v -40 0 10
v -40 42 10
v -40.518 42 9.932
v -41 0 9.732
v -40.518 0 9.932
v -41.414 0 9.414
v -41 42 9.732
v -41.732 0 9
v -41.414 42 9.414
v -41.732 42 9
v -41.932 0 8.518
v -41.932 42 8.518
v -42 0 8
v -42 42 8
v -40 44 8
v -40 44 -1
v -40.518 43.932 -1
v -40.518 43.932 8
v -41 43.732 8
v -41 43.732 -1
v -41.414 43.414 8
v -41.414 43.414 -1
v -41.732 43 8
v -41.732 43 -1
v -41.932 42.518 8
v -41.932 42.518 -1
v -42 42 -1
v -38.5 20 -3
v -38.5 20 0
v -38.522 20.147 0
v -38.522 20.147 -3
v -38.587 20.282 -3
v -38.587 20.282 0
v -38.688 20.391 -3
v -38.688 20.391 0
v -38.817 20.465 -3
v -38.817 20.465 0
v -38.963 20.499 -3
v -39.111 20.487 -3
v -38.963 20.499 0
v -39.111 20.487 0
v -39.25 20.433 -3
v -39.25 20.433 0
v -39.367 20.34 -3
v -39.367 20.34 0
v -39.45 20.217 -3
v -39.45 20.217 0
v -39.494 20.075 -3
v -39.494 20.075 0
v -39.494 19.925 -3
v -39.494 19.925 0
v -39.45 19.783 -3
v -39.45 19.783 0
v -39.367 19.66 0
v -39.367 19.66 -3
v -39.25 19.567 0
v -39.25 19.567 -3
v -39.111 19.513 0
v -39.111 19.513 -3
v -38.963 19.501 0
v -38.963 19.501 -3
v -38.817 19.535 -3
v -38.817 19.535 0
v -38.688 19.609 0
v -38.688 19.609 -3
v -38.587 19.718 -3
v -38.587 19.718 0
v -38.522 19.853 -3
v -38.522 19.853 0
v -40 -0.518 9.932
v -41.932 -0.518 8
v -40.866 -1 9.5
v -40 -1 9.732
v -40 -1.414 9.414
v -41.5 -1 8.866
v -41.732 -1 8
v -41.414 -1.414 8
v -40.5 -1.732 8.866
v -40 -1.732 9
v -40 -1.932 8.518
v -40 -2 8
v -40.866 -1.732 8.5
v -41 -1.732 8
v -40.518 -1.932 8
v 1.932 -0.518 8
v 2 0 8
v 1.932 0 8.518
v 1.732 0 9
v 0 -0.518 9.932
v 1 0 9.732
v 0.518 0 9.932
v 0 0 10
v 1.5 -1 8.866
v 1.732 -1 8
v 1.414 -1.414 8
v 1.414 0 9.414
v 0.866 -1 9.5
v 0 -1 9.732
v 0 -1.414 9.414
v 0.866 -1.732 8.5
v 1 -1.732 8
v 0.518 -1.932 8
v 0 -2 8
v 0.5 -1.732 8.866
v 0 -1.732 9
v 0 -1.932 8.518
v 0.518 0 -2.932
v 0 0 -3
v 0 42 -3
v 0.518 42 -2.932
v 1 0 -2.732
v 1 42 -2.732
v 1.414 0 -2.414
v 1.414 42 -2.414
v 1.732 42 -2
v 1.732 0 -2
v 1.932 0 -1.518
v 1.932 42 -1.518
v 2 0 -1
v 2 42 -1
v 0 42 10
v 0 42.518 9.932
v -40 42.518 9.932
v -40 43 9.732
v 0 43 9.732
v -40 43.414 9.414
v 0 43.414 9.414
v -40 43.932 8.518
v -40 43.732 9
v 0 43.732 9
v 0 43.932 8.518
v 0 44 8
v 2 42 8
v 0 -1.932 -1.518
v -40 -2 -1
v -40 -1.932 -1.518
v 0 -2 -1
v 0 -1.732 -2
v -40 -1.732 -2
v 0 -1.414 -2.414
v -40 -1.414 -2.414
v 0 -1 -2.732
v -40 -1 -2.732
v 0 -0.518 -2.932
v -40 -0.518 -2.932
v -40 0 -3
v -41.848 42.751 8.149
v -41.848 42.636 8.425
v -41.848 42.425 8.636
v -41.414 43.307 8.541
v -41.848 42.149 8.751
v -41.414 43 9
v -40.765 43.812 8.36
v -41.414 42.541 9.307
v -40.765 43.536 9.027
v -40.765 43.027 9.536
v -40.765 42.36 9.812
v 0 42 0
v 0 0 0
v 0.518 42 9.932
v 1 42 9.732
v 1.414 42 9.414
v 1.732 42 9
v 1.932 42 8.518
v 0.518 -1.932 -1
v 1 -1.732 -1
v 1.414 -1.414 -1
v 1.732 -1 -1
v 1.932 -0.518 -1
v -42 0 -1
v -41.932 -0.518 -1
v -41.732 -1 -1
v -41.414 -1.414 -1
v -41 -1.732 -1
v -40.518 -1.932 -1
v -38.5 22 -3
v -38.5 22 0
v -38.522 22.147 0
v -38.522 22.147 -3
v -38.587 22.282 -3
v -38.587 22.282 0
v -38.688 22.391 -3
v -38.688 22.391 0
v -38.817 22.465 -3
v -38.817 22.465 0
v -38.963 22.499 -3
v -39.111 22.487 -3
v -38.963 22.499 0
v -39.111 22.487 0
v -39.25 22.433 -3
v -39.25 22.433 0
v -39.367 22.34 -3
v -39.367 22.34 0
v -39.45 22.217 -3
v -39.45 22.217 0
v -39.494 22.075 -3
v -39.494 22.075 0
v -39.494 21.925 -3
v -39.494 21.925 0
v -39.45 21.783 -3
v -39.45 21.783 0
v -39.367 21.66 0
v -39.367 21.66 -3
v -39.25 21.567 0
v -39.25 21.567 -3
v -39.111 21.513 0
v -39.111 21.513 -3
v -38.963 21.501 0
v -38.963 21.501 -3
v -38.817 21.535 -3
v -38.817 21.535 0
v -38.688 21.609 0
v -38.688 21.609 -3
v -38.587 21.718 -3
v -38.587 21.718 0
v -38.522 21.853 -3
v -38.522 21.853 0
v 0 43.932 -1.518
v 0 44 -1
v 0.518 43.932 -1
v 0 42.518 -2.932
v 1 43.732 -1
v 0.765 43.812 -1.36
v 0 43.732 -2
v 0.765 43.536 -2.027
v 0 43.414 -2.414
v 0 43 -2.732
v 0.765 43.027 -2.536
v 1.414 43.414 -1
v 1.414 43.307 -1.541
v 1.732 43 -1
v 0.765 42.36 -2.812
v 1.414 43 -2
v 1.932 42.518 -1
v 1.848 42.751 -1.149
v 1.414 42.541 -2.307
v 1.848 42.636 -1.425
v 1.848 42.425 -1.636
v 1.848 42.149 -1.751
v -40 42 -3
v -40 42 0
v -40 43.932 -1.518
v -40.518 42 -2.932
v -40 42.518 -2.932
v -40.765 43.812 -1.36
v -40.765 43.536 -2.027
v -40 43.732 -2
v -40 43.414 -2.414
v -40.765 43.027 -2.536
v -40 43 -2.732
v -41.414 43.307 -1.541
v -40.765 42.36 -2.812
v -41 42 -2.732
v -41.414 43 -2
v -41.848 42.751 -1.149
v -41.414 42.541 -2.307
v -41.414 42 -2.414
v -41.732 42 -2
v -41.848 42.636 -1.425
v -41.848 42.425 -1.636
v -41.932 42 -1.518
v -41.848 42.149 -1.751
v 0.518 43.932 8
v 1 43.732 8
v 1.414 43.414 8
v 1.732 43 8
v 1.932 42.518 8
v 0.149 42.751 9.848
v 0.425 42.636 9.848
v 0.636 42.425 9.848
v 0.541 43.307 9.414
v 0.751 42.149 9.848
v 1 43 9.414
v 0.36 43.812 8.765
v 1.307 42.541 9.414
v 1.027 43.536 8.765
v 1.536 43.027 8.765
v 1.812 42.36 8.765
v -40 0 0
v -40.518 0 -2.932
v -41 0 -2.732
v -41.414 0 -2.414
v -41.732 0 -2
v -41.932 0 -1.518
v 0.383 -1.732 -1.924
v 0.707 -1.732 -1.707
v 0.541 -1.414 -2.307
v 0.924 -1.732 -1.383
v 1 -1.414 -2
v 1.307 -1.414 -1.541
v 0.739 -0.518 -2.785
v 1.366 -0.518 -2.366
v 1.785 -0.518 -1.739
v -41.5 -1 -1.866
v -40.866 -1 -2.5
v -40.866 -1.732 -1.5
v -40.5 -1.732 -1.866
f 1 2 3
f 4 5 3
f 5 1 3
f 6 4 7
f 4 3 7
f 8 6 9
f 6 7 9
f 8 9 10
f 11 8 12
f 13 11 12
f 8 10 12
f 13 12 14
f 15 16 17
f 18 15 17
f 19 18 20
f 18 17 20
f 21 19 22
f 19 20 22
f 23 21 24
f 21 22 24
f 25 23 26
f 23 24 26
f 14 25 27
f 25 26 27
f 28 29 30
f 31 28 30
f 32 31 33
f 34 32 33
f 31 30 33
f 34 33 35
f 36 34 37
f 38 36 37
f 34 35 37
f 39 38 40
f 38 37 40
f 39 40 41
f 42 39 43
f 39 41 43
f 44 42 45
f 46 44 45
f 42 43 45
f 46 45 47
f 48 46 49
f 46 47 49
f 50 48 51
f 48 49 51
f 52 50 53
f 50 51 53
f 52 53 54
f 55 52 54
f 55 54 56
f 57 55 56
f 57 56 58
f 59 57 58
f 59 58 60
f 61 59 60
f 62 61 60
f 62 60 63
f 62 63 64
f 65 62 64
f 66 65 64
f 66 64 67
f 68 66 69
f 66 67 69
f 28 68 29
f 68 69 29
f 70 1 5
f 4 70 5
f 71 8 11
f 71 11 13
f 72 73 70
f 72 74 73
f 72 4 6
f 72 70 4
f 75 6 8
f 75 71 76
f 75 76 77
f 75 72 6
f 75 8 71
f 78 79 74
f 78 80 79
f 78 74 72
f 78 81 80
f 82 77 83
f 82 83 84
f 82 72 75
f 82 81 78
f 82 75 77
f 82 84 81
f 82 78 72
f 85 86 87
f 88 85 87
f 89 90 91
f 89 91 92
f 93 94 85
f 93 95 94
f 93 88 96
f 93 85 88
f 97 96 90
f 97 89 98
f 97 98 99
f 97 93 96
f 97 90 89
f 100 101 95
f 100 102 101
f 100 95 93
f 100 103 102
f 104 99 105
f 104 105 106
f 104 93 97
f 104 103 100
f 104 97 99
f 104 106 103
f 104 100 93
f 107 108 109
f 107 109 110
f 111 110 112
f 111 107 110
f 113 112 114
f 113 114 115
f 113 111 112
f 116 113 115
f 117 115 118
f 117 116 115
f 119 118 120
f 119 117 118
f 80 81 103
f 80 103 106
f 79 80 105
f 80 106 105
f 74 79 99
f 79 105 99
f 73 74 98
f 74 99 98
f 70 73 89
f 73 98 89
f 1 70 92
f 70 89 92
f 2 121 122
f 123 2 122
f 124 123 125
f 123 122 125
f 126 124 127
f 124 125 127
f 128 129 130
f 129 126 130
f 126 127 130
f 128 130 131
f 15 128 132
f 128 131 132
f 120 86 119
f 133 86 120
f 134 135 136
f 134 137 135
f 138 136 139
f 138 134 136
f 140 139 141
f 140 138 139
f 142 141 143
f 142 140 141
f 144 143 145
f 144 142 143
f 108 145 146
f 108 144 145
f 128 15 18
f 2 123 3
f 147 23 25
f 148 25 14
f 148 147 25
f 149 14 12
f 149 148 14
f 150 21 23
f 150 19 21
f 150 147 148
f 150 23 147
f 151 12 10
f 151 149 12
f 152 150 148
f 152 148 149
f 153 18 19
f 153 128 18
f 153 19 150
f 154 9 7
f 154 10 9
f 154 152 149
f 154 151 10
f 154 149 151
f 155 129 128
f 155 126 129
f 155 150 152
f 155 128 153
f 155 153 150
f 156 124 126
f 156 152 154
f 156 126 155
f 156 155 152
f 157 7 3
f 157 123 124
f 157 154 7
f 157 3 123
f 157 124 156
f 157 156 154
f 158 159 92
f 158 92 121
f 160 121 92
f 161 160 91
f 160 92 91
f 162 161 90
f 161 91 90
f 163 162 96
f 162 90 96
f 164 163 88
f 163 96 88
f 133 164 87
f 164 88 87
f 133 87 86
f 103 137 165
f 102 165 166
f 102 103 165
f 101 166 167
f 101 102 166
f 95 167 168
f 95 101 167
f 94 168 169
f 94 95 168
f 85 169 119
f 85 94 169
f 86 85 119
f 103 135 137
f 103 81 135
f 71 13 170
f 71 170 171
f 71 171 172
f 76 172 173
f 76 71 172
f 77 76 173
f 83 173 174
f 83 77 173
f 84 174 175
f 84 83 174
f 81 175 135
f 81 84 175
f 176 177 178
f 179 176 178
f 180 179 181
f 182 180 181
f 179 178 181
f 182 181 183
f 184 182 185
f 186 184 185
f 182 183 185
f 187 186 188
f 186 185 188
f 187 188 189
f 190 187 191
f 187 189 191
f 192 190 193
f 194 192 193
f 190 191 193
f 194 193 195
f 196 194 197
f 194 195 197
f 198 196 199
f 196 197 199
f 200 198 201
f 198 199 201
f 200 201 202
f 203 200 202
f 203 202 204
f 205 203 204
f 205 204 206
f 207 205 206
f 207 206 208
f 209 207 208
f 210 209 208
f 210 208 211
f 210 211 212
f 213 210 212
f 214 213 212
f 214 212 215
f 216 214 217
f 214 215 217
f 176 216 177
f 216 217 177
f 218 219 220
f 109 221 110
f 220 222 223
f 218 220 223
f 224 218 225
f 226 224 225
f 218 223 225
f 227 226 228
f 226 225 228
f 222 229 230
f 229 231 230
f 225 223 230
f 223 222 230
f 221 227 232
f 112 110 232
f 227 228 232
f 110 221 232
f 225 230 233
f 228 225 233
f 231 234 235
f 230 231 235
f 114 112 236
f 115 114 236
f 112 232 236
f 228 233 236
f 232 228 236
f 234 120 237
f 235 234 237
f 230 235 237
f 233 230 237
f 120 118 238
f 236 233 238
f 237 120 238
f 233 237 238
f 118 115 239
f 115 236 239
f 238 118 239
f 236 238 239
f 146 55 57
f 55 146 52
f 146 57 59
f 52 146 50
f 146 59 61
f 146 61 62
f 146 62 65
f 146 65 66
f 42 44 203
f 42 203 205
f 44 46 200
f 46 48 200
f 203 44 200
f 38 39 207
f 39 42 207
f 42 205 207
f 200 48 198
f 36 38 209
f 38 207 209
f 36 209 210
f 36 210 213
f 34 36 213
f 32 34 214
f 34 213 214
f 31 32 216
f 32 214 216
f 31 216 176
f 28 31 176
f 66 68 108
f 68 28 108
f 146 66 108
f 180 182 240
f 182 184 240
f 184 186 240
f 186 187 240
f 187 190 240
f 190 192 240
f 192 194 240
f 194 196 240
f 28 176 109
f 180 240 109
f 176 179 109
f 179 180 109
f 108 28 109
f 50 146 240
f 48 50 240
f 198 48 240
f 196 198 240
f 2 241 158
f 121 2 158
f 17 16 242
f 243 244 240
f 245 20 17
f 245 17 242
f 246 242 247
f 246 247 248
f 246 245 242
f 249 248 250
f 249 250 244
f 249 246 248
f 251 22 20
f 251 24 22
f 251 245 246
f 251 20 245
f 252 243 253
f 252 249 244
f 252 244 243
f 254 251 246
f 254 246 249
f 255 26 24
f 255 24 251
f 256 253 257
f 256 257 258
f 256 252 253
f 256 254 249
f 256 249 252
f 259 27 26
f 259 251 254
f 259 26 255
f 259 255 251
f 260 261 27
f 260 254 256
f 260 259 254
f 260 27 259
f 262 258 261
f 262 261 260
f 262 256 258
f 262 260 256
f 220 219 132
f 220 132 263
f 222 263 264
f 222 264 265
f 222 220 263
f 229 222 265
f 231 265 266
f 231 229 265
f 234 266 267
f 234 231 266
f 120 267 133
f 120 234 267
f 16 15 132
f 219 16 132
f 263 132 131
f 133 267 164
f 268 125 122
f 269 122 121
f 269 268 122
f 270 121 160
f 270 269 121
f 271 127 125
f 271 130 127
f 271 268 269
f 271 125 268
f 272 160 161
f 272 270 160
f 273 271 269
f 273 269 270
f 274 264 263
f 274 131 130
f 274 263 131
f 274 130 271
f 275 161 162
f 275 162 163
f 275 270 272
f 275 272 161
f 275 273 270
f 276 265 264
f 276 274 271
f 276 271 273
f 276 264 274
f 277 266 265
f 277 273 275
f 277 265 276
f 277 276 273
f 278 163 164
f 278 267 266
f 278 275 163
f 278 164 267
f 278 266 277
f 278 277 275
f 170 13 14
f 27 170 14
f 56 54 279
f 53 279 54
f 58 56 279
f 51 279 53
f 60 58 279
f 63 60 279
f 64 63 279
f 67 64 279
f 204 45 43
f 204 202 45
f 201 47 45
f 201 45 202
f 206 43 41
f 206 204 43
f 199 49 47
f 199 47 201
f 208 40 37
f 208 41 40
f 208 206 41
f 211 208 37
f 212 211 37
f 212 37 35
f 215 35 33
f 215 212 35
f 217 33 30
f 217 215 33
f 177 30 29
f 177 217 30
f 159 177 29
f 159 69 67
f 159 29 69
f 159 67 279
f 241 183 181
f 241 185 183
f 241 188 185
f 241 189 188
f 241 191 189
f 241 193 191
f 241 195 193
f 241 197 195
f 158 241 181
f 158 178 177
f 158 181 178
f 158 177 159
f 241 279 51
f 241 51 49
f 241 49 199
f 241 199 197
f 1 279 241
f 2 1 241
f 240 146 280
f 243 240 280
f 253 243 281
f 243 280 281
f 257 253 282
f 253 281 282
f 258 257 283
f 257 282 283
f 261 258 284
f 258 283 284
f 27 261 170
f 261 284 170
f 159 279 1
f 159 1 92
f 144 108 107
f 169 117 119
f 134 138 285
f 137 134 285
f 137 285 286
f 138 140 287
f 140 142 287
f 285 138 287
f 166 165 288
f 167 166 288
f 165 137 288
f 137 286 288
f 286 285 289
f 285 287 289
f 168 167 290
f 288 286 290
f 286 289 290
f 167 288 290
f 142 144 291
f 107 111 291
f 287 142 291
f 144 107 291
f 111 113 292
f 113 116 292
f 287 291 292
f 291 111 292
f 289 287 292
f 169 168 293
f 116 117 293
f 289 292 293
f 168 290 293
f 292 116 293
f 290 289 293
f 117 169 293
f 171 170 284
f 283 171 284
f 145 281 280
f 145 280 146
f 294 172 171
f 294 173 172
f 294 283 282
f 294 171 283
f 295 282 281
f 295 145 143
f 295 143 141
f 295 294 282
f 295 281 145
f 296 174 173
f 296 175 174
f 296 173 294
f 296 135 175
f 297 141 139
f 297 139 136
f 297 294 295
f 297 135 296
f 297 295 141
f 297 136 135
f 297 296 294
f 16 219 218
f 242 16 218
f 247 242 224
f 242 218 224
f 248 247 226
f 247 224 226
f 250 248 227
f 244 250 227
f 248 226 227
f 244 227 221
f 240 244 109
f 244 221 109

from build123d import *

# Parameters (mm, degrees)
SKETCH_1_W          = 40
SKETCH_1_H          = 42
EXTRUDE_1_DEPTH     = 10
SKETCH_2_W          = 44
SKETCH_2_H          = 46
EXTRUDE_2_DEPTH     = 3
FILLET_1_R          = 2
FILLET_2_R          = 2
FILLET_3_R          = 2
FILLET_4_R          = 2
FILLET_5_R          = 2
SKETCH_4_R          = 0.5
CUT_EXTRUDE_1_DEPTH = 3


# Some blends are built 0.0001 mm under size
with BuildPart() as part:
    # 草图1 → 凸台-拉伸1 (new body)
    with BuildSketch(Plane.XY):
        Polygon((-42, -2), (0, -2), (2, -2), (2, 44), (-42, 44), align=None)
        with Locations((-20, 21)):
            Rectangle(SKETCH_1_W, SKETCH_1_H, mode=Mode.SUBTRACT)
    extrude(amount=EXTRUDE_1_DEPTH)

    # 草图2 → 凸台-拉伸2 (add)
    with BuildSketch(Plane.XY):
        with Locations((-20, 21)):
            Rectangle(SKETCH_2_W, SKETCH_2_H)
    extrude(amount=-EXTRUDE_2_DEPTH)

    # 圆角1
    fillet_1_edges = [part.edges().sort_by_distance(p)[0] for p in [
        (-20, 44, -3),
    ]]
    fillet(fillet_1_edges, radius=FILLET_1_R)

    # 圆角2
    fillet_2_edges = [part.edges().sort_by_distance(p)[0] for p in [
        (2, 44, 4.5),
        (2, 20, -3),
        (2, 43.414213562, -2.414213562),
    ]]
    fillet(fillet_2_edges, radius=FILLET_2_R)

    # 圆角3
    fillet_3_edges = [part.edges().sort_by_distance(p)[0] for p in [
        (-42, -2, 3.5),
        (2, -2, 4.5),
        (-21, -2, -3),
        (1.414213562, -2, -2.414213562),
        (-20, -2, 10),
    ]]
    fillet(fillet_3_edges, radius=FILLET_3_R - 0.0001)  # a hair under: the kernel refuses the full size

    # 圆角4
    # the kernel refuses this fillet: 2 mm, written as the material it takes off along each edge
    with BuildSketch(Plane(origin=(0, -2, 8), x_dir=(1, 0, 0), z_dir=(0, 0, -1))) as fillet_4_piece_1:
        with BuildLine():
            CenterArc((0.0001, -1.9999), 1.9999, 0, 90)
            Line((2, -1.9999), (2, 0))
            Line((2, 0), (0.0001, 0))
        make_face()
    revolve(axis=Axis((0, -2, 8), (0, -1, 0)), revolution_arc=90, mode=Mode.SUBTRACT)
    with BuildSketch(Plane(origin=(0, 44, 10), x_dir=(0, -1, 0), z_dir=(-1, 0, 0))) as fillet_4_piece_2:
        with BuildLine():
            CenterArc((FILLET_4_R, -FILLET_4_R), FILLET_4_R, 90, 90)
            Line((0, -FILLET_4_R), (0, 0))
            Line((0, 0), (FILLET_4_R, 0))
        make_face()
    extrude(amount=47, mode=Mode.SUBTRACT)
    with BuildSketch(Plane(origin=(0, 42, 10), x_dir=(0, 1, 0), z_dir=(-1, 0, 0))) as fillet_4_piece_3:
        with BuildLine():
            CenterArc((2 - FILLET_4_R, FILLET_4_R), FILLET_4_R, 270, 90)
            Line((2, FILLET_4_R), (2, 0))
            Line((2, 0), (2 - FILLET_4_R, 0))
        make_face()
    revolve(axis=Axis((0, 42, 10), (0, 0, -1)), revolution_arc=90, mode=Mode.SUBTRACT)
    with BuildSketch(Plane(origin=(2, -2, 10), x_dir=(-1, 0, 0), z_dir=(0, 1, 0))) as fillet_4_piece_4:
        with BuildLine():
            CenterArc((FILLET_4_R, -FILLET_4_R), FILLET_4_R, 90, 90)
            Line((0, -FILLET_4_R), (0, 0))
            Line((0, 0), (FILLET_4_R, 0))
        make_face()
    extrude(amount=44, mode=Mode.SUBTRACT)

    # 圆角5
    # the kernel refuses this fillet: 2 mm, written as the material it takes off along each edge
    with BuildSketch(Plane(origin=(-40, -2, 8), x_dir=(0, 0, 1), z_dir=(1, 0, 0))) as fillet_5_piece_1:
        with BuildLine():
            CenterArc((0.0001, -1.9999), 1.9999, 0, 90)
            Line((2, -1.9999), (2, 0))
            Line((2, 0), (0.0001, 0))
        make_face()
    revolve(axis=Axis((-40, -2, 8), (0, -1, 0)), revolution_arc=90, mode=Mode.SUBTRACT)
    with BuildSketch(Plane(origin=(-40, -2, -1), x_dir=(-1, 0, 0), z_dir=(0, 0, 1))) as fillet_5_piece_2:
        with BuildLine():
            CenterArc((0.0001, -1.9999), 1.9999, 0, 90)
            Line((2, -1.9999), (2, 0))
            Line((2, 0), (0.0001, 0))
        make_face()
    revolve(axis=Axis((-40, -2, -1), (0, -1, 0)), revolution_arc=90, mode=Mode.SUBTRACT)
    with BuildSketch(Plane(origin=(-42, 42, 10), x_dir=(0, 0, -1), z_dir=(0, -1, 0)), Plane(origin=(-42, -2, -3), x_dir=(0, 0, 1), z_dir=(0, 1, 0))) as fillet_5_piece_3:
        with BuildLine():
            CenterArc((FILLET_5_R, FILLET_5_R), FILLET_5_R, 180, 90)
            Line((0, FILLET_5_R), (0, 0))
            Line((0, 0), (FILLET_5_R, 0))
        make_face()
    extrude(amount=44, mode=Mode.SUBTRACT)
    with BuildSketch(Plane(origin=(-42, 42, 8), x_dir=(0, 1, 0), z_dir=(0, 0, -1))) as fillet_5_piece_4:
        with BuildLine():
            CenterArc((2 - FILLET_5_R, FILLET_5_R), FILLET_5_R, 270, 90)
            Line((2, FILLET_5_R), (2, 0))
            Line((2, 0), (2 - FILLET_5_R, 0))
        make_face()
    revolve(axis=Axis((-42, 42, 8), (1, 0, 0)), revolution_arc=90, mode=Mode.SUBTRACT)
    with BuildSketch(Plane(origin=(-42, 44, -1), x_dir=(0, -1, 0), z_dir=(0, 0, 1))) as fillet_5_piece_5:
        with BuildLine():
            CenterArc((FILLET_5_R, FILLET_5_R), FILLET_5_R, 180, 90)
            Line((0, FILLET_5_R), (0, 0))
            Line((0, 0), (FILLET_5_R, 0))
        make_face()
    extrude(amount=9, mode=Mode.SUBTRACT)
    with BuildSketch(Plane(origin=(-42, 42, -1), x_dir=(0, 1, 0), z_dir=(0, 0, 1))) as fillet_5_piece_6:
        with BuildLine():
            CenterArc((2 - FILLET_5_R, -FILLET_5_R), FILLET_5_R, 0, 90)
            Line((2, -FILLET_5_R), (2, 0))
            Line((2, 0), (2 - FILLET_5_R, 0))
        make_face()
    revolve(axis=Axis((-42, 42, -1), (-1, 0, 0)), revolution_arc=90, mode=Mode.SUBTRACT)

    # 草图4 → 切除-拉伸1 (cut)
    with BuildSketch(Plane.XY):
        with Locations((-39, 22)):
            Circle(SKETCH_4_R)
        with Locations((-39, 20)):
            Circle(SKETCH_4_R)
    extrude(amount=-CUT_EXTRUDE_1_DEPTH, mode=Mode.SUBTRACT)


solid = part.part
